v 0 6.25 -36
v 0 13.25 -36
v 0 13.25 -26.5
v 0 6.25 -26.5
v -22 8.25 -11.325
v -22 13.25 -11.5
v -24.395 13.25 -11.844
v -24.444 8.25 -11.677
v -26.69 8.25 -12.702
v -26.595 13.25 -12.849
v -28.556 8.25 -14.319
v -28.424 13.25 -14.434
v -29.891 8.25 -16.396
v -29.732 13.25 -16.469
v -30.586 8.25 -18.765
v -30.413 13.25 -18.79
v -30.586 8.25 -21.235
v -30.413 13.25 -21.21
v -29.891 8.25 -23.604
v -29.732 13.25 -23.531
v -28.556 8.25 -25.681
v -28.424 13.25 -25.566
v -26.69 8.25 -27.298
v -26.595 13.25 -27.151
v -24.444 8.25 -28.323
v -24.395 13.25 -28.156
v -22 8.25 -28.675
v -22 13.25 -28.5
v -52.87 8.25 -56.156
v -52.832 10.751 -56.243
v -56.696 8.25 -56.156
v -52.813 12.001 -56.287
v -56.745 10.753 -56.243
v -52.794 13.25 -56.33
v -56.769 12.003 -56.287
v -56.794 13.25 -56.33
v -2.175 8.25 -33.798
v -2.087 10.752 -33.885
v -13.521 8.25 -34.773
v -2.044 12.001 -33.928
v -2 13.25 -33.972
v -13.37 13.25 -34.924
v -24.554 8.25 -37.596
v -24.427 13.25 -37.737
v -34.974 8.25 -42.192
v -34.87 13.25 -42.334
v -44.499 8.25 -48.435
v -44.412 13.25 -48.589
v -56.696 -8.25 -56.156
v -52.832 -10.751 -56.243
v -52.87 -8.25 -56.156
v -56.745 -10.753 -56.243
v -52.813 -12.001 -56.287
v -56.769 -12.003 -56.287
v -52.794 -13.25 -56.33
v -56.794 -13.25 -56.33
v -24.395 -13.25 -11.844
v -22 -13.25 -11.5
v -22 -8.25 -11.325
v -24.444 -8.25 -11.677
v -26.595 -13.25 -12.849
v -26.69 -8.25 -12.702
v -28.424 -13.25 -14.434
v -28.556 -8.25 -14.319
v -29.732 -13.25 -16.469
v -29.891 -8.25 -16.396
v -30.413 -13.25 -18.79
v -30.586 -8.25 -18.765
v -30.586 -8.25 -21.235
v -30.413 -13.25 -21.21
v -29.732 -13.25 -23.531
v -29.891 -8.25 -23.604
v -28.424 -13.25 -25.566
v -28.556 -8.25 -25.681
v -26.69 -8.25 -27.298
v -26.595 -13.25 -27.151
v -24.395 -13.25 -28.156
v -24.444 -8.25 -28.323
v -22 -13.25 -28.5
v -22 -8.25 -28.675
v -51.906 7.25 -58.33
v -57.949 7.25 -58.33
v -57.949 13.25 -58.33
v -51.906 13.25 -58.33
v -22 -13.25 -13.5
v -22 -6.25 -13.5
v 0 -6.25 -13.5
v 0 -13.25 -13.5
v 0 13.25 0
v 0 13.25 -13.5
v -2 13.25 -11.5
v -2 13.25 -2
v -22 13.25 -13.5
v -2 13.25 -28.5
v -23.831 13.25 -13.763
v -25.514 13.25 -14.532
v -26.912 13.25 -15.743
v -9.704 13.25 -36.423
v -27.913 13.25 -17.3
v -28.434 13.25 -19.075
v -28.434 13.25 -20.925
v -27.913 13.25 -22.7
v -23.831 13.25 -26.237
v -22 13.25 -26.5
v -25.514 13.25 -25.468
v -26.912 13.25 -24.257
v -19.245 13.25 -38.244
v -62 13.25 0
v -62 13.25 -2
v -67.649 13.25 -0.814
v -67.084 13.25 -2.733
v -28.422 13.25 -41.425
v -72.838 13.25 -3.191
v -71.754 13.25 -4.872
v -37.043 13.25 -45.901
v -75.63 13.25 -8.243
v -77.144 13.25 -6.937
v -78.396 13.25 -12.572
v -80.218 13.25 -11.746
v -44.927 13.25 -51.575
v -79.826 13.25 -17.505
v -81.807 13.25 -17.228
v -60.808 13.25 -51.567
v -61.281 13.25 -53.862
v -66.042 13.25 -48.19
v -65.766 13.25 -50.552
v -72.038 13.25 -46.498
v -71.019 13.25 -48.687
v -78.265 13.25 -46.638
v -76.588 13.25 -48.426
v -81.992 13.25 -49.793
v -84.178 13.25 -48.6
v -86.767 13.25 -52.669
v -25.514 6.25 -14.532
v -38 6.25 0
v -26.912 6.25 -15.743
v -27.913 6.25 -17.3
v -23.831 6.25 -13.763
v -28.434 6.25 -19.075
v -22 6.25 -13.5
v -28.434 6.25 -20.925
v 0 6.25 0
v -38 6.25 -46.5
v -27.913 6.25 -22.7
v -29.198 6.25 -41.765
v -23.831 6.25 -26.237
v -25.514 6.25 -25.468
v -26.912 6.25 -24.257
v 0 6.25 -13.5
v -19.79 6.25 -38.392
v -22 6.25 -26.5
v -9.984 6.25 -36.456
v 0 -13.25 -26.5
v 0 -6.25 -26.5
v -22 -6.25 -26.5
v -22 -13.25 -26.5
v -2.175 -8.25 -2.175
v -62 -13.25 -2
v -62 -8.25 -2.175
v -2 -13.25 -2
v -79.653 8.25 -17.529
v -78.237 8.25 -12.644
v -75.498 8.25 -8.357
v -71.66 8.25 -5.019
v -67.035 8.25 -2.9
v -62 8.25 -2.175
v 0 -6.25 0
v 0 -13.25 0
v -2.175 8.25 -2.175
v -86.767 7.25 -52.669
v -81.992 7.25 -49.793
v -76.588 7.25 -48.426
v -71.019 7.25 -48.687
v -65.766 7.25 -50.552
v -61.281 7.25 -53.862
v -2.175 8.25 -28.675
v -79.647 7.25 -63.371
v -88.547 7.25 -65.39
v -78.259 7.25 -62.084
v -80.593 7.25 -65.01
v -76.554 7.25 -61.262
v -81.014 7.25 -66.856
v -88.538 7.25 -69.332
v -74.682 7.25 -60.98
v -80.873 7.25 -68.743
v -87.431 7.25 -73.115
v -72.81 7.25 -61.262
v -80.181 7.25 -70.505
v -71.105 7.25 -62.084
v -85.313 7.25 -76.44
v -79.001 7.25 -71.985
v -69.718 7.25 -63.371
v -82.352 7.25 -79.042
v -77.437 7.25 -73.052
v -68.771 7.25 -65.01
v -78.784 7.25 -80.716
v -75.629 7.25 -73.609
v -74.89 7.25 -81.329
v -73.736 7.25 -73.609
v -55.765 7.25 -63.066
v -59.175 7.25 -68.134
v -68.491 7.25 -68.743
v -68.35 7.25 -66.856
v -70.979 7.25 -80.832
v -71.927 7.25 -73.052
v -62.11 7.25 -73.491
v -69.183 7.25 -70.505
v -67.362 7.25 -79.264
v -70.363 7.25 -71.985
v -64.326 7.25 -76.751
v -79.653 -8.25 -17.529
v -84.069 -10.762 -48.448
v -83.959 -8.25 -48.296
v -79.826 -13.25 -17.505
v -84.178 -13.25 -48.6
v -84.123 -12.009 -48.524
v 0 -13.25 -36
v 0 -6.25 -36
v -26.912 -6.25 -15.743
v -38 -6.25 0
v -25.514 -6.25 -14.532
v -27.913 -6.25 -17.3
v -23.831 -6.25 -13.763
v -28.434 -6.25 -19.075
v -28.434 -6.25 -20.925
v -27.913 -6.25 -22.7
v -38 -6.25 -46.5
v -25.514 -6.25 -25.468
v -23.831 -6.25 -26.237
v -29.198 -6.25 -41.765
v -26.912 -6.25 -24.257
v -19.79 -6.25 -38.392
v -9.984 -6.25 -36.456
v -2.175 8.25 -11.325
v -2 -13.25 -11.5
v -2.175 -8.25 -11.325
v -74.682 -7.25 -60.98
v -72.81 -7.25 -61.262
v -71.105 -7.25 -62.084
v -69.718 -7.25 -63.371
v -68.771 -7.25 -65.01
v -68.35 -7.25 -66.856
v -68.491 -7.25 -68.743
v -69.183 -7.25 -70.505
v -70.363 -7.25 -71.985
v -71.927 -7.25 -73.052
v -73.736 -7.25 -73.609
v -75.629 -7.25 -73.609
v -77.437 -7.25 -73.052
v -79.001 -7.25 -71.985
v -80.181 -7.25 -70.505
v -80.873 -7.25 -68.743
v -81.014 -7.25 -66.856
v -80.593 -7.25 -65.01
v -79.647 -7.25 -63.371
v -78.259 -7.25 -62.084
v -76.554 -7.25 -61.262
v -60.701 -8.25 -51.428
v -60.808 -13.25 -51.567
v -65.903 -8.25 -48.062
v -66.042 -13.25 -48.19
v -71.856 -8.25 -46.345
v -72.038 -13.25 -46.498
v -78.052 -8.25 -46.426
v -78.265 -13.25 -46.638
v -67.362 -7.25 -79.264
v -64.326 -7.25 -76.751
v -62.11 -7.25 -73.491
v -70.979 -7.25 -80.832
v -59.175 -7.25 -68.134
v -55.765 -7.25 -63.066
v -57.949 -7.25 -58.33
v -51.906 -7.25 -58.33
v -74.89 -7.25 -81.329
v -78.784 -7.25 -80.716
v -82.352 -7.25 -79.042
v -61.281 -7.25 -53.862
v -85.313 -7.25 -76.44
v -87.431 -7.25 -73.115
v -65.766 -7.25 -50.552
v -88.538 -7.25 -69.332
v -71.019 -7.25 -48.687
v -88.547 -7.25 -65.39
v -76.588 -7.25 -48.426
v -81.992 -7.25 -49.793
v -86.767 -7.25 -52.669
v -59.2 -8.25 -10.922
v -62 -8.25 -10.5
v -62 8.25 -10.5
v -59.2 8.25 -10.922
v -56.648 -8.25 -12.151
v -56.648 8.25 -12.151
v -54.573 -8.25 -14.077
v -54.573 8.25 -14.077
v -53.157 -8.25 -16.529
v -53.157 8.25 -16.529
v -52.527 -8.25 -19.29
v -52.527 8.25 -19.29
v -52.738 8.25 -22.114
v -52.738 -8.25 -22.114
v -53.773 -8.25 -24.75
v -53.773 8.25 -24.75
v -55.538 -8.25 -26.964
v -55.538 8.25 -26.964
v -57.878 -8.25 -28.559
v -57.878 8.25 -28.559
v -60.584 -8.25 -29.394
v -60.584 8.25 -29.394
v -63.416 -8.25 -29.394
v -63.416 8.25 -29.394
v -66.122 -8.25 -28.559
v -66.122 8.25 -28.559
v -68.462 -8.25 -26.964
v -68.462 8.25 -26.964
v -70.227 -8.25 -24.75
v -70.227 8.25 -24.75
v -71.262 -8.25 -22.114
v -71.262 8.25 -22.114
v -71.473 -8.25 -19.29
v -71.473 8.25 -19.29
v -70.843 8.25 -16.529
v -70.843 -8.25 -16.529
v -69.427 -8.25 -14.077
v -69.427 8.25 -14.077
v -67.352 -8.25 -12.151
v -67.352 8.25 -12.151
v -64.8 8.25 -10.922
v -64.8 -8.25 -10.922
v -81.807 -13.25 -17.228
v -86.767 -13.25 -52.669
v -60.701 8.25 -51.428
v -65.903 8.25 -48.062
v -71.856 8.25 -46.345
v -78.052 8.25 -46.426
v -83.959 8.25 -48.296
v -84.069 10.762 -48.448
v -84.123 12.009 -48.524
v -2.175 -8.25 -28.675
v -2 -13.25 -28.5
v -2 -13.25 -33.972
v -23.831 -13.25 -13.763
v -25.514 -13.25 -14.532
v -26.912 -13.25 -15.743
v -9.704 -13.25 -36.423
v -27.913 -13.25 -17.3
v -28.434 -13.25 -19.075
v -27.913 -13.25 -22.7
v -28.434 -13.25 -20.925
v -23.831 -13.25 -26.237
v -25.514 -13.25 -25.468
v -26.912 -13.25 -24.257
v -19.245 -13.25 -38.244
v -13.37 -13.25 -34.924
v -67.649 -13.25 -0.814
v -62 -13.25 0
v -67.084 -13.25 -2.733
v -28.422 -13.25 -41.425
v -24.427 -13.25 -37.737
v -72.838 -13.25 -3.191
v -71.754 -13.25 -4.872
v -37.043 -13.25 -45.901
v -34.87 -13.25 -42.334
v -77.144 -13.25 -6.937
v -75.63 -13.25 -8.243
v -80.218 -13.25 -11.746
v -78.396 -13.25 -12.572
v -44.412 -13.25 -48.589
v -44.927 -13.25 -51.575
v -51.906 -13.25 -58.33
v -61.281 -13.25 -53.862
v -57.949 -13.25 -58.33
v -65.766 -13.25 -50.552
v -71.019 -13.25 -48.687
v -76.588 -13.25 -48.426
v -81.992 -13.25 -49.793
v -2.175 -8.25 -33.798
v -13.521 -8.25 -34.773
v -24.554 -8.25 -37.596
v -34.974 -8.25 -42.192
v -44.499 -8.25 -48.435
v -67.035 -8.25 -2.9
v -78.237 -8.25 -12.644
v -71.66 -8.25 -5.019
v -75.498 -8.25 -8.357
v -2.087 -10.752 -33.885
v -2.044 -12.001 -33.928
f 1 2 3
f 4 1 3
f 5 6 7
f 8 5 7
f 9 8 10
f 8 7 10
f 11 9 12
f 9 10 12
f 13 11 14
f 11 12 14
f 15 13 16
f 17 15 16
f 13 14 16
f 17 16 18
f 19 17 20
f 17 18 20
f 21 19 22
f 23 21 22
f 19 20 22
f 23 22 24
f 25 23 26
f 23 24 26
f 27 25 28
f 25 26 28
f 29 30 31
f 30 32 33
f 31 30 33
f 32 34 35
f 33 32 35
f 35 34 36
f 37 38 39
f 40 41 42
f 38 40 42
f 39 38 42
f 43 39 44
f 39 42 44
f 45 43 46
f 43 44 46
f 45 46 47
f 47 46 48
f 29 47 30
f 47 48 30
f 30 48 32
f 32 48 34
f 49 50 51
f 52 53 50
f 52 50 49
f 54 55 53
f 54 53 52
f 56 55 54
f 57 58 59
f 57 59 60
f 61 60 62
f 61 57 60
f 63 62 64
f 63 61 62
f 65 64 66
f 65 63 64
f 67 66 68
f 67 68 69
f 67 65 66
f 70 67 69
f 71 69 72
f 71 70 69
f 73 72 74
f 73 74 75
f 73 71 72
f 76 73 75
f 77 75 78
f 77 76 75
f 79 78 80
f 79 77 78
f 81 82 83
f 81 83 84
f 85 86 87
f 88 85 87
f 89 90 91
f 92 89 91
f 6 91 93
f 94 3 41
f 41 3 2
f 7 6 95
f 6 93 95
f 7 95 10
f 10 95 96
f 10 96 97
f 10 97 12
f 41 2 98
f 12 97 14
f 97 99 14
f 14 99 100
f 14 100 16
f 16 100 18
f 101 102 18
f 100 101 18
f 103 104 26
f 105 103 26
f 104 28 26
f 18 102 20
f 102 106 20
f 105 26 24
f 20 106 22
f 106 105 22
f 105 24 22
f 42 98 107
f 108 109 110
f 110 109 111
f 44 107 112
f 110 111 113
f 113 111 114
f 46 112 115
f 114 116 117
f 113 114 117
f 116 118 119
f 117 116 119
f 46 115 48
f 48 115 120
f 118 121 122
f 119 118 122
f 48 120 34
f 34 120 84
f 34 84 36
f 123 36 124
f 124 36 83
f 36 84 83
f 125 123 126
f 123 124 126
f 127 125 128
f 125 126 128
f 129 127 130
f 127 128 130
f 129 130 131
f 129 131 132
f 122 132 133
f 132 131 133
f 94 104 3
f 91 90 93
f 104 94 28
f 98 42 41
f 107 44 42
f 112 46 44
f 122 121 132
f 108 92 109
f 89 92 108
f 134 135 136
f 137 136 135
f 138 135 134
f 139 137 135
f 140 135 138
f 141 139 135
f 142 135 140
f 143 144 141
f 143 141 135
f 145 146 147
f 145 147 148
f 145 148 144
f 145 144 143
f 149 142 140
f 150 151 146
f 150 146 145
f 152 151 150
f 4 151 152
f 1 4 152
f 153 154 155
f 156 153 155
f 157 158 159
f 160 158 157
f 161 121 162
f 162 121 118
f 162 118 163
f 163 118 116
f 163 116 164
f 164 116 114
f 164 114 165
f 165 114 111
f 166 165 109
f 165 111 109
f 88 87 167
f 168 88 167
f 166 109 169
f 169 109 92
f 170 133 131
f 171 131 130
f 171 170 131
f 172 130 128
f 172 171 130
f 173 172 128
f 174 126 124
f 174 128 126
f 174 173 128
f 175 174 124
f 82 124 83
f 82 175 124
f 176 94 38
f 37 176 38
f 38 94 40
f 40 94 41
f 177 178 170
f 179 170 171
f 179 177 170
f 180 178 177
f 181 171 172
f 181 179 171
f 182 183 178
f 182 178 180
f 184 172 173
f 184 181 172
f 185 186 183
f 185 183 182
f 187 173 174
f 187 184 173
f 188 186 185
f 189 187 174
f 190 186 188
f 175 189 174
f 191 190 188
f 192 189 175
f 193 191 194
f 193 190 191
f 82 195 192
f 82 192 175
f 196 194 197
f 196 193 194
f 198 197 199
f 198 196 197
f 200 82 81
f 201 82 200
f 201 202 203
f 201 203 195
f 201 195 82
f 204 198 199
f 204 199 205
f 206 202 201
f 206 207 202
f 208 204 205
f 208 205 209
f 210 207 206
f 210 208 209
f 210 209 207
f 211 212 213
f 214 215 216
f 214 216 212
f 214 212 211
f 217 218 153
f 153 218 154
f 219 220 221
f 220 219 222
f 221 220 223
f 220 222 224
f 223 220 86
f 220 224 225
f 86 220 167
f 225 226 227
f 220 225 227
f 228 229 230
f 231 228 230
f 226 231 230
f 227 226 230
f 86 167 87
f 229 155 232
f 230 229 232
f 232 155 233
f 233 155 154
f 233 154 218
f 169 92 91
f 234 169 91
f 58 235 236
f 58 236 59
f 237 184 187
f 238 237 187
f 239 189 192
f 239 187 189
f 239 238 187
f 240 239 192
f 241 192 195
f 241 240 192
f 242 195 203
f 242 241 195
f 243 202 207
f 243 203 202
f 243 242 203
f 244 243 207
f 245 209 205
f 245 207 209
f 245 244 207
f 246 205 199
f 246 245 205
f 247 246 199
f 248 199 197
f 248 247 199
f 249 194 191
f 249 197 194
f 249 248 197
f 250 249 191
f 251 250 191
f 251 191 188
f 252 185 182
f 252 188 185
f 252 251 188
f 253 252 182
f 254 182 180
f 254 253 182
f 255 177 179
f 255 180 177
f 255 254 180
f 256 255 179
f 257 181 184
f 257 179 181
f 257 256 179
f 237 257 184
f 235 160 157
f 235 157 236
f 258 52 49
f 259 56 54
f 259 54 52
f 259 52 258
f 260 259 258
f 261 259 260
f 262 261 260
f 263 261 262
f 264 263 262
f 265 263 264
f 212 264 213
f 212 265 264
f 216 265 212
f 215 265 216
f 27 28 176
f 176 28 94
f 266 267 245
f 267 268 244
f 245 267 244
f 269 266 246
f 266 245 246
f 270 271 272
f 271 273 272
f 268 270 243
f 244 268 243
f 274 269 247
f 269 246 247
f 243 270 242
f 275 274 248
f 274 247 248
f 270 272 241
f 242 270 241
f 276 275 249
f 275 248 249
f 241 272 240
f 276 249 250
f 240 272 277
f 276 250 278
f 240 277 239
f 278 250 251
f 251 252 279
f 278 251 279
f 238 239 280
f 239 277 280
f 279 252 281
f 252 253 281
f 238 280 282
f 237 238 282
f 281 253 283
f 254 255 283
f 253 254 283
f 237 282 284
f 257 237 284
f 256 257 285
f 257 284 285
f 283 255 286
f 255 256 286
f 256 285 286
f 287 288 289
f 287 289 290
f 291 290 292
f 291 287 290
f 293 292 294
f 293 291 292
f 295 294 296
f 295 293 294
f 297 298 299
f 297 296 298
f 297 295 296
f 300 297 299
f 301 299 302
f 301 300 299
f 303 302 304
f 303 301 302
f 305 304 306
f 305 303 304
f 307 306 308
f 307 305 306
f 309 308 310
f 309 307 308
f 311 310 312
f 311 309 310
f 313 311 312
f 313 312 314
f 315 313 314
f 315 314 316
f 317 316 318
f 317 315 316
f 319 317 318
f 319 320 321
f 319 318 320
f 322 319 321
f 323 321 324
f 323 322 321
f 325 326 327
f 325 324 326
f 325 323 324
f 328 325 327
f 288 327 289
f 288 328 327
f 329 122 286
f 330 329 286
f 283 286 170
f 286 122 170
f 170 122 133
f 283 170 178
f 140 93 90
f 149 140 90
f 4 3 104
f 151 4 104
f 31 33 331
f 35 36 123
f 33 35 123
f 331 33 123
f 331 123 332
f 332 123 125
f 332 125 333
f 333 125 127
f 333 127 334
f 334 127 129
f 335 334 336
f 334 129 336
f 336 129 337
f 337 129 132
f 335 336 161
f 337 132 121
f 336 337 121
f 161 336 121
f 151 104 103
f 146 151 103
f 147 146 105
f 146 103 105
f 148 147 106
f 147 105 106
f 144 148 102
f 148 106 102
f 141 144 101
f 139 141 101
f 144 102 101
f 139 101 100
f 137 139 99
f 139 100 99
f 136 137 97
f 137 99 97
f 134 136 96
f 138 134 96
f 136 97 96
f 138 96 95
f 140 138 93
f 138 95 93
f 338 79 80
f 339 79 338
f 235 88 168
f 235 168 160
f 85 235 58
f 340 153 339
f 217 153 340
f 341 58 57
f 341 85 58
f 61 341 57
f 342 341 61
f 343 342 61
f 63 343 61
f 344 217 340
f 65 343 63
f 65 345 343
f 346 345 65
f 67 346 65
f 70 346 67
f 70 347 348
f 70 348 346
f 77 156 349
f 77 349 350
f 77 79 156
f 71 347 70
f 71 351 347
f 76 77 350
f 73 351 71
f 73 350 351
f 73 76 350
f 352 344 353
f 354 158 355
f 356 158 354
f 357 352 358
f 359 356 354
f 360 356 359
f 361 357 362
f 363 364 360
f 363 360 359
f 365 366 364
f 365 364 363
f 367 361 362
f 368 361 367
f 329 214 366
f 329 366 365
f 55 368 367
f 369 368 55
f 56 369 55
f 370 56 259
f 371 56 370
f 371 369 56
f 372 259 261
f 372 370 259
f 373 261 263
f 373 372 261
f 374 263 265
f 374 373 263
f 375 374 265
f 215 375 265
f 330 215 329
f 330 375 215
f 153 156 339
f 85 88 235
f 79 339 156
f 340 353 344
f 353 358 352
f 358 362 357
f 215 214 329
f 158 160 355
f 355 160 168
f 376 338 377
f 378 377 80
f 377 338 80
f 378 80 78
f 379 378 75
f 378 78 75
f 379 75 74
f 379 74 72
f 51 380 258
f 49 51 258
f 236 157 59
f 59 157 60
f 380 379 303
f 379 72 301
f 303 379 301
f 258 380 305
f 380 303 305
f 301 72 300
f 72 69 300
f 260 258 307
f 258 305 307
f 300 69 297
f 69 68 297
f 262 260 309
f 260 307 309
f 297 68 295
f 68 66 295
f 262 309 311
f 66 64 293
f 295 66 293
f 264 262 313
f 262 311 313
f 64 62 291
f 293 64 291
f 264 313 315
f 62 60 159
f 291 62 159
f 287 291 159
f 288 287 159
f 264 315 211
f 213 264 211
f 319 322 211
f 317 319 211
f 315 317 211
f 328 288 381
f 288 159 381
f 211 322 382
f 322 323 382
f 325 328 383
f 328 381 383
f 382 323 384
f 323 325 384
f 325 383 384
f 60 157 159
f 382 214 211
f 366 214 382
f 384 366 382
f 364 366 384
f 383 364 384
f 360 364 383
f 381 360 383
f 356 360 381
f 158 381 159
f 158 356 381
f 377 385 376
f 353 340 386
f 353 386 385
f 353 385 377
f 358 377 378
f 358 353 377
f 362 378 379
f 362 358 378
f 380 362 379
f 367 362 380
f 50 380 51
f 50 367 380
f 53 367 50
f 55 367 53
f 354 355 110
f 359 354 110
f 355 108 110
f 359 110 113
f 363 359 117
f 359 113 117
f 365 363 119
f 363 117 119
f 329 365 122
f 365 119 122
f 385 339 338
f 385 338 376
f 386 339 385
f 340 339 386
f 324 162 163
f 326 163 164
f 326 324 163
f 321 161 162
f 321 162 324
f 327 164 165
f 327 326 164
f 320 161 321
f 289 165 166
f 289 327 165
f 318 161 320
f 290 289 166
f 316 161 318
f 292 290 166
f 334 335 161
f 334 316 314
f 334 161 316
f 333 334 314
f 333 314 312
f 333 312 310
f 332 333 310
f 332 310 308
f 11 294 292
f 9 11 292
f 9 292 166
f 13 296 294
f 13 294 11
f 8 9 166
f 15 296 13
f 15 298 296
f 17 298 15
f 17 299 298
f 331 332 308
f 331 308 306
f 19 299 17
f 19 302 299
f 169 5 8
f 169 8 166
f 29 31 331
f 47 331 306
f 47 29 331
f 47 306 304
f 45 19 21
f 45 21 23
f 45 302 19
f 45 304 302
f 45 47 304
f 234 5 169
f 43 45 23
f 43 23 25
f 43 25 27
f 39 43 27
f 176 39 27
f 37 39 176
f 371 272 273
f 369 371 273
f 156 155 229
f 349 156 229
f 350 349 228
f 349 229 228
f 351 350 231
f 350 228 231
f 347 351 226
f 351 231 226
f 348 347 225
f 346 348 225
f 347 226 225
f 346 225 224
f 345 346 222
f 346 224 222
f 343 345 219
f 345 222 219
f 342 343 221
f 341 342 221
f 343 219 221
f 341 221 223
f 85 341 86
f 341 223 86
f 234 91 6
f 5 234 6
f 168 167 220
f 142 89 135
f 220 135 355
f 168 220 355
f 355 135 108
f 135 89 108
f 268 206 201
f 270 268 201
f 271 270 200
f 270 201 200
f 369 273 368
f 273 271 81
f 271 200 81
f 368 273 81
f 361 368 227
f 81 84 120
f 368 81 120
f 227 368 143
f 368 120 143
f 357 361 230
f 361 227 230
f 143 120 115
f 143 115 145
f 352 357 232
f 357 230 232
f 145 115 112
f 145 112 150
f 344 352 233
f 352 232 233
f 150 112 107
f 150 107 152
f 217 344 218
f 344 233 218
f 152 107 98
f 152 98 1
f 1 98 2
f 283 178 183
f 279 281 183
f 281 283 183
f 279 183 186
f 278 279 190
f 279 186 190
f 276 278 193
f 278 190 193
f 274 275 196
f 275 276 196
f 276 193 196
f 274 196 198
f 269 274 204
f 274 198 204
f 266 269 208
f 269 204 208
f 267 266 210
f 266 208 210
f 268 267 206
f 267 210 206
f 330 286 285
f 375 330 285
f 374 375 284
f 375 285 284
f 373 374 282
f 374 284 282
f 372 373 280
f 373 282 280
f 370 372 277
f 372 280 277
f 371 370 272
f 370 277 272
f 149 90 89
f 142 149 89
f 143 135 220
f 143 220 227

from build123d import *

# Parameters (mm, degrees)
SKETCH1_R               = 9.5
SKETCH1_R_2             = 6.35
BOSS_EXTRUDE1_DEPTH     = 13.25
SKETCH2_W               = 73.338944958
SKETCH2_H               = 12.5
CUT_EXTRUDE3_DEPTH      = 38
CUT_EXTRUDE5_DEPTH      = 124.21282036
CUT_EXTRUDE5_DEPTH_BACK = 6
CUT_EXTRUDE6_DEPTH      = 124.21282036
CUT_EXTRUDE6_DEPTH_BACK = 6
CUT_EXTRUDE8_DEPTH      = 5
CUT_EXTRUDE8_DRAFT      = -2
MIRROR8_COPY_1_DEPTH    = 5
MIRROR8_COPY_1_DRAFT    = -2


with BuildPart() as part:
    # Sketch1 → Boss-Extrude1 (new, symmetric)
    with BuildSketch(Plane(origin=(0, 0, 0), x_dir=(1, 0, 0), z_dir=(0, 1, 0))):
        with BuildLine():
            Line((0, 0), (-62, 0))
            ThreePointArc((-62, 0), (-75.125587601, 4.90964049), (-81.806983567, 17.228104986))
            Line((-81.806983567, 17.228104986), (-88.547021707, 65.390038979))
            ThreePointArc((-88.547021707, 65.390038979), (-78.78369233, 80.716074763), (-62.110282709, 73.49060696))
            ThreePointArc((-62.110282709, 73.49060696), (-36.56849942, 45.611382856), (0, 36))
            Line((0, 36), (0, 26.5))
            Line((0, 26.5), (-22, 26.5))
            ThreePointArc((-22, 26.5), (-28.5, 20), (-22, 13.5))
            Line((-22, 13.5), (0, 13.5))
            Line((0, 13.5), (0, 0))
        make_face()
        with Locations(Location((-62, 20, 0), (0, 0, 270))):
            Circle(SKETCH1_R, mode=Mode.SUBTRACT)
        with Locations(Location((-74.68213321, 67.330365488, 0), (0, 0, 270))):
            Circle(SKETCH1_R_2, mode=Mode.SUBTRACT)
    extrude(amount=BOSS_EXTRUDE1_DEPTH, both=True)

    # Sketch2 → Cut-Extrude3 (cut)
    with BuildSketch(Plane(origin=(0, 0, 0), x_dir=(0, 0, -1), z_dir=(1, 0, 0))):
        with Locations((36.669472479, 0)):
            Rectangle(SKETCH2_W, SKETCH2_H)
    extrude(amount=-CUT_EXTRUDE3_DEPTH, mode=Mode.SUBTRACT)

    # Sketch3 → Cut-Extrude5 (cut, two sides: drawn at the far end of the back side and taken through both)
    with BuildSketch(Plane(origin=(0, 13.25, 0), x_dir=(1, 0, 0), z_dir=(0, 1, 0)).offset(-CUT_EXTRUDE5_DEPTH_BACK)):
        with BuildLine():
            Line((-251.132551902, 188.14493361), (-86.7667399, 52.668773448))
            ThreePointArc((-86.7667399, 52.668773448), (-71.019379836, 48.686754311), (-57.948932679, 58.330365488))
            Line((-57.948932679, 58.330365488), (-51.906439966, 58.330365488))
            Line((-51.906439966, 58.330365488), (161.095696471, 58.330365488))
            Line((161.095696471, 58.330365488), (289.053745356, 464.663207174))
            Line((289.053745356, 464.663207174), (-123.174503017, 594.477775296))
            Line((-123.174503017, 594.477775296), (-251.132551902, 188.14493361))
        make_face()
    extrude(amount=CUT_EXTRUDE5_DEPTH + CUT_EXTRUDE5_DEPTH_BACK, mode=Mode.SUBTRACT)

    # Sketch4 → Cut-Extrude6 (cut, two sides: drawn at the far end of the back side and taken through both)
    with BuildSketch(Plane.XZ.offset(13.25).offset(-CUT_EXTRUDE6_DEPTH_BACK)):
        with BuildLine():
            Line((-251.132551902, -188.14493361), (-86.7667399, -52.668773448))
            ThreePointArc((-86.7667399, -52.668773448), (-71.019379836, -48.686754311), (-57.948932679, -58.330365488))
            Line((-57.948932679, -58.330365488), (-51.906439966, -58.330365488))
            Line((-51.906439966, -58.330365488), (161.095696471, -58.330365488))
            Line((161.095696471, -58.330365488), (289.053745356, -464.663207174))
            Line((289.053745356, -464.663207174), (-123.174503017, -594.477775296))
            Line((-123.174503017, -594.477775296), (-251.132551902, -188.14493361))
        make_face()
    extrude(amount=CUT_EXTRUDE6_DEPTH + CUT_EXTRUDE6_DEPTH_BACK, mode=Mode.SUBTRACT)


with BuildPart() as cut_extrude8_tool:
    # Sketch6 → Cut-Extrude8 (with draft: the straight prism first)
    with BuildSketch(Plane(origin=(0, 13.25, 0), x_dir=(1, 0, 0), z_dir=(0, 1, 0))):
        with BuildLine():
            Line((-2, 28.5), (-2, 33.971784495))
            ThreePointArc((-2, 33.971784495), (-29.743751646, 39.819333442), (-52.793597737, 56.330365488))
            Line((-52.793597737, 56.330365488), (-56.79358939, 56.330365488))
            ThreePointArc((-56.79358939, 56.330365488), (-68.976857381, 47.120223784), (-84.177824667, 48.599859789))
            Line((-84.177824667, 48.599859789), (-79.826285211, 17.505294488))
            ThreePointArc((-79.826285211, 17.505294488), (-73.813028841, 6.418676441), (-62, 2))
            Line((-62, 2), (-2, 2))
            Line((-2, 2), (-2, 11.5))
            Line((-2, 11.5), (-22, 11.5))
            ThreePointArc((-22, 11.5), (-30.5, 20), (-22, 28.5))
            Line((-22, 28.5), (-2, 28.5))
        make_face()
    extrude(amount=-CUT_EXTRUDE8_DEPTH)
    # Cut-Extrude8: the draft: its side faces are tilted about the plane it starts from
    cut_extrude8_sides = [cut_extrude8_tool.faces().sort_by_distance(p)[0] for p in [
        (-12, 10.75, -28.5),
        (-2, 10.75, -31.235892247),
        (-29.743751646, 10.75, -39.819333442),
        (-54.793593564, 10.75, -56.330365488),
        (-68.976857381, 10.75, -47.120223784),
        (-82.002054939, 10.75, -33.052577138),
        (-73.813028841, 10.75, -6.418676441),
        (-32, 10.75, -2),
        (-2, 10.75, -6.75),
        (-12, 10.75, -11.5),
        (-30.5, 10.75, -20),
    ]]
    draft(cut_extrude8_sides, Plane(origin=(0, 13.25, 0), x_dir=(1, 0, 0), z_dir=(0, 1, 0)), CUT_EXTRUDE8_DRAFT)


with BuildPart() as part_1:
    add(part.part)

    # Cut-Extrude8: cut by cut_extrude8_tool
    add(cut_extrude8_tool.part, mode=Mode.SUBTRACT)


with BuildPart() as mirror8_copy_1_tool:
    # Mirror8 copy 1 sketch → Mirror8 copy 1 (with draft: the straight prism first)
    with BuildSketch(Plane.XZ.offset(13.25)):
        with BuildLine():
            Line((-2, -28.5), (-2, -33.971784495))
            ThreePointArc((-2, -33.971784495), (-29.743751646, -39.819333442), (-52.793597737, -56.330365488))
            Line((-52.793597737, -56.330365488), (-56.79358939, -56.330365488))
            ThreePointArc((-56.79358939, -56.330365488), (-68.976857381, -47.120223784), (-84.177824667, -48.599859789))
            Line((-84.177824667, -48.599859789), (-79.826285211, -17.505294488))
            ThreePointArc((-79.826285211, -17.505294488), (-73.813028841, -6.418676441), (-62, -2))
            Line((-62, -2), (-2, -2))
            Line((-2, -2), (-2, -11.5))
            Line((-2, -11.5), (-22, -11.5))
            ThreePointArc((-22, -11.5), (-30.5, -20), (-22, -28.5))
            Line((-22, -28.5), (-2, -28.5))
        make_face()
    extrude(amount=-MIRROR8_COPY_1_DEPTH)
    # Mirror8 copy 1: the draft: its side faces are tilted about the plane it starts from
    mirror8_copy_1_sides = [mirror8_copy_1_tool.faces().sort_by_distance(p)[0] for p in [
        (-12, -10.75, -28.5),
        (-2, -10.75, -31.235892247),
        (-29.743751646, -10.75, -39.819333442),
        (-54.793593564, -10.75, -56.330365488),
        (-68.976857381, -10.75, -47.120223784),
        (-82.002054939, -10.75, -33.052577138),
        (-73.813028841, -10.75, -6.418676441),
        (-32, -10.75, -2),
        (-2, -10.75, -6.75),
        (-12, -10.75, -11.5),
        (-30.5, -10.75, -20),
    ]]
    draft(mirror8_copy_1_sides, Plane.XZ.offset(13.25), MIRROR8_COPY_1_DRAFT)


with BuildPart() as part_2:
    add(part_1.part)

    # Mirror8 copy 1: cut by mirror8_copy_1_tool
    add(mirror8_copy_1_tool.part, mode=Mode.SUBTRACT)


solid = part_2.part
